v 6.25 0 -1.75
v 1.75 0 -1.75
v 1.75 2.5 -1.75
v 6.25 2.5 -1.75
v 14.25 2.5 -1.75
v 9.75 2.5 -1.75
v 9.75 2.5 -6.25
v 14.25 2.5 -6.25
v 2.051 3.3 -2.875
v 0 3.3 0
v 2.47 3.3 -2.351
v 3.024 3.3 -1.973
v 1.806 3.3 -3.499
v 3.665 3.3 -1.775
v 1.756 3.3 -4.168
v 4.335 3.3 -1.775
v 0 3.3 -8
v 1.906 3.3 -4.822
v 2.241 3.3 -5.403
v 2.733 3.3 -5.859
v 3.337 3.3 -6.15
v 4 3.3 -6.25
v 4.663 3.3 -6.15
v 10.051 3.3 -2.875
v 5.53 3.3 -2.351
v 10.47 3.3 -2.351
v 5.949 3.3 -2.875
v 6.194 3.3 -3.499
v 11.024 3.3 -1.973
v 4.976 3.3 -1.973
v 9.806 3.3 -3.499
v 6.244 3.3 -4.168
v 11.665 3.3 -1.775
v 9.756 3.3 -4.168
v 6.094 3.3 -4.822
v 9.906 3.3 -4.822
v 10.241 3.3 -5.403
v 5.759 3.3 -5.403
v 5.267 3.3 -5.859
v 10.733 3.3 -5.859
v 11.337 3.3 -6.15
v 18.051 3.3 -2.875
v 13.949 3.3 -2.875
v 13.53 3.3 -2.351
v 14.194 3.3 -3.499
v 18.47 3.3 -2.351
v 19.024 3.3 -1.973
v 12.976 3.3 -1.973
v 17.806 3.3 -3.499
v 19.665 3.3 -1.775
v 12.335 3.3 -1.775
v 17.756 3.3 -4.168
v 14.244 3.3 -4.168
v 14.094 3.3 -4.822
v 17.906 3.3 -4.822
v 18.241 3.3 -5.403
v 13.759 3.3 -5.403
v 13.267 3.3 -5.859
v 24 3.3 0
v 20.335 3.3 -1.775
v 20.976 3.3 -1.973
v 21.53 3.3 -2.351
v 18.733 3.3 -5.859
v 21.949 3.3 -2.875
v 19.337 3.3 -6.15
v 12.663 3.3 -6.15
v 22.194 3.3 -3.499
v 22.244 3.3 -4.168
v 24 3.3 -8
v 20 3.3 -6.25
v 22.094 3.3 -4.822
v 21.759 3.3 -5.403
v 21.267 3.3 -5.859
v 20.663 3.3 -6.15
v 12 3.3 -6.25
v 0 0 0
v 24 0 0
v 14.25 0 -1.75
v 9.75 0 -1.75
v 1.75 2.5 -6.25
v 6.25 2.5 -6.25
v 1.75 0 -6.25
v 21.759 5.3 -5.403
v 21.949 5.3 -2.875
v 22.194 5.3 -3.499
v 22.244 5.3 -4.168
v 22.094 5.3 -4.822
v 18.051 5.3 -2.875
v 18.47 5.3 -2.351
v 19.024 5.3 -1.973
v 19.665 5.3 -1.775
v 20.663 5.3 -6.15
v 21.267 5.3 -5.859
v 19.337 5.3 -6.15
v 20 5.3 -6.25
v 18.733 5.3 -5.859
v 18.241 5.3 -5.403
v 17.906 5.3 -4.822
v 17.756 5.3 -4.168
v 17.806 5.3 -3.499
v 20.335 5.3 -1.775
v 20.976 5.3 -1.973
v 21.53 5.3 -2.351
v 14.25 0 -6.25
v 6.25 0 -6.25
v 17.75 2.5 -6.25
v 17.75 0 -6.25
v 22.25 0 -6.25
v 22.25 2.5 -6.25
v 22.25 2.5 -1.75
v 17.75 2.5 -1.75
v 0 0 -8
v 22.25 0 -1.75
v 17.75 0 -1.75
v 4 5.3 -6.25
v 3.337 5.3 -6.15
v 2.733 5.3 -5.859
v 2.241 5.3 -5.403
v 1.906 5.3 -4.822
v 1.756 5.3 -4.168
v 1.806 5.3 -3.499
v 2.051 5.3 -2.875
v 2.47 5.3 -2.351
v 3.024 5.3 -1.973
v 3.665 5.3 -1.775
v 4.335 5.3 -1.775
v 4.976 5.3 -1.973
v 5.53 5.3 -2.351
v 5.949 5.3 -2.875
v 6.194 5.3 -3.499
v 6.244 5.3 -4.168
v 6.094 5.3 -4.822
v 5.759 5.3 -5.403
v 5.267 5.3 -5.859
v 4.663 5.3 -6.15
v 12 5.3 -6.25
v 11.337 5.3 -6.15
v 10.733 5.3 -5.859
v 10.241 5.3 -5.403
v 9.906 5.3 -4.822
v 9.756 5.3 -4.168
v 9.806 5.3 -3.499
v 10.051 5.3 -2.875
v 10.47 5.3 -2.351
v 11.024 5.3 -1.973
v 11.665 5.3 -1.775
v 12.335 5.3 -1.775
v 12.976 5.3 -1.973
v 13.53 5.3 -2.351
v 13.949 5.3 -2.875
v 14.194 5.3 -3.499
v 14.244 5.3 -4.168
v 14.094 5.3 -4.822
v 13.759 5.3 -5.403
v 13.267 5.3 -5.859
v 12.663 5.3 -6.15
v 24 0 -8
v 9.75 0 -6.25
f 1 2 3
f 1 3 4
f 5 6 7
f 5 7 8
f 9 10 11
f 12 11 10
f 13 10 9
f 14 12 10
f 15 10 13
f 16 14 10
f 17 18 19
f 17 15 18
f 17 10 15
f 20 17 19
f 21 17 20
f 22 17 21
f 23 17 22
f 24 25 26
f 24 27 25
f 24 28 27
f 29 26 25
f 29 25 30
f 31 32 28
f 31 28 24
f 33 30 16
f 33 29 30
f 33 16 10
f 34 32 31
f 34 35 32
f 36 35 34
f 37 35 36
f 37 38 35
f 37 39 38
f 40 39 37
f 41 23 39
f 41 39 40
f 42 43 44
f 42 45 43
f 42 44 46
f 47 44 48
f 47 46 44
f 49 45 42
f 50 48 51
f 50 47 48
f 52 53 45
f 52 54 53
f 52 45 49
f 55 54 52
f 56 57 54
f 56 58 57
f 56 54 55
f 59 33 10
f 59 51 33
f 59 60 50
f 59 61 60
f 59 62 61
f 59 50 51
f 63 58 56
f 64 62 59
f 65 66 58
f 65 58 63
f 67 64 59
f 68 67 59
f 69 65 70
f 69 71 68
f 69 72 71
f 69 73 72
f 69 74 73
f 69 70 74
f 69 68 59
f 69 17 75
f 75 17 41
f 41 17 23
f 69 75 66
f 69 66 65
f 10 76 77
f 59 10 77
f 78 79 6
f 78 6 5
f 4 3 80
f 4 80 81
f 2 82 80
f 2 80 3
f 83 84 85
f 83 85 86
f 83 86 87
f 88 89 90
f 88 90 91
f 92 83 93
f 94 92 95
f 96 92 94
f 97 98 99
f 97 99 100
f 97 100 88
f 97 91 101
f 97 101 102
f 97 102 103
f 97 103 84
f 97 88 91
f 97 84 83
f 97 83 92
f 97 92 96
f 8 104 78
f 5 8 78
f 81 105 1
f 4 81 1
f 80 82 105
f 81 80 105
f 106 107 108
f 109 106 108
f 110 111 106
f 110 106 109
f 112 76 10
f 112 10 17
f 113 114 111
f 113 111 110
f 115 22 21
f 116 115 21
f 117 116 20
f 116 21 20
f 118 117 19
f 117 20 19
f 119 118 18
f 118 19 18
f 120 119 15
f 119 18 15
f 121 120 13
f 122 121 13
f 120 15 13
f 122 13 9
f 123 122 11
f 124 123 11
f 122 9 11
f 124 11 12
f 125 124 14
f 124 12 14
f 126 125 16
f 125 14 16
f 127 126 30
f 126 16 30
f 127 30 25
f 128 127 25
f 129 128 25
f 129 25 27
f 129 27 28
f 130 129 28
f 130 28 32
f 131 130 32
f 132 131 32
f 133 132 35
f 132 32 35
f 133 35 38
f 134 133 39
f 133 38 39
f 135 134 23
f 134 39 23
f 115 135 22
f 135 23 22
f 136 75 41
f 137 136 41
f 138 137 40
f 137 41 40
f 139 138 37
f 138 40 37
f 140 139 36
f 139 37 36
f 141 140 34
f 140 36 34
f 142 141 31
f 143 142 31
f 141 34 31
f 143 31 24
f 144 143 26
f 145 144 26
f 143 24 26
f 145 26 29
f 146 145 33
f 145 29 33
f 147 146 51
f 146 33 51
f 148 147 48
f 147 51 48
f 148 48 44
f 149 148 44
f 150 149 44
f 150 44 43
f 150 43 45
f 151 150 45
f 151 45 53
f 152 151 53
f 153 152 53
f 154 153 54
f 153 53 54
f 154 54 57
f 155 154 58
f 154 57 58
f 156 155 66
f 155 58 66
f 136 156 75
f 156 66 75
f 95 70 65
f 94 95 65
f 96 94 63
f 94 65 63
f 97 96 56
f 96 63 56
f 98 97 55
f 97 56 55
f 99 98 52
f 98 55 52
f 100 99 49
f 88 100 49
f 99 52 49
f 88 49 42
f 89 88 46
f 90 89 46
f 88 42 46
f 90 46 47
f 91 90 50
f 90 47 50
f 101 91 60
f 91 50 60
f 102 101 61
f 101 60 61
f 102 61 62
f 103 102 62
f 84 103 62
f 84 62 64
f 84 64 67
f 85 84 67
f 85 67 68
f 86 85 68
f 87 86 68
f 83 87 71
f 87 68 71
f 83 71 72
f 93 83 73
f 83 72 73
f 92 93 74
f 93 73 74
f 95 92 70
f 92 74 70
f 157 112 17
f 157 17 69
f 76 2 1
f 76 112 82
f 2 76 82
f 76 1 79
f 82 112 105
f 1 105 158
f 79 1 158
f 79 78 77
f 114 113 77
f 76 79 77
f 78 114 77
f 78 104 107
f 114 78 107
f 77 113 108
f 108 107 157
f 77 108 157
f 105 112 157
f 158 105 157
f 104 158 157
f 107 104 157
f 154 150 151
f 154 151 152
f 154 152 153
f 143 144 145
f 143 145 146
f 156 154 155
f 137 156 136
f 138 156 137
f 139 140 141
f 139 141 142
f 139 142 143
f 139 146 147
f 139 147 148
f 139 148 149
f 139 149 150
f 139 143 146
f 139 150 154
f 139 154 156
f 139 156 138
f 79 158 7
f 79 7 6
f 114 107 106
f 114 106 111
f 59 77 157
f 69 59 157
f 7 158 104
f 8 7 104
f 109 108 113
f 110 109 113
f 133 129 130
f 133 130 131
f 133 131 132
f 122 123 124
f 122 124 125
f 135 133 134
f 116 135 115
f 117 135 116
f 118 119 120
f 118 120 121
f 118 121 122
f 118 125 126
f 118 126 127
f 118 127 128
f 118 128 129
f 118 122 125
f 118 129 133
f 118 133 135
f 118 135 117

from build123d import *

# Parameters (mm, degrees)
SKETCH1_W       = 24
SKETCH1_H       = 8
EXTRUDE1_DEPTH  = 3.3
SKETCH2_R       = 2.25
EXTRUDE2_DEPTH  = 2
SKETCH3_W       = 4.5
SKETCH3_H       = 4.5
EXTRUDE3_DEPTH  = 2.5
LPATTERN1_COUNT = 4
LPATTERN1_PITCH = 8
LPATTERN2_COUNT = 4
LPATTERN2_PITCH = 8


with BuildPart() as part:
    # Sketch1 → Extrude1 (new body)
    with BuildSketch(Plane(origin=(0, 0, 0), x_dir=(1, 0, 0), z_dir=(0, 1, 0))):
        with Locations((12, 4)):
            Rectangle(SKETCH1_W, SKETCH1_H)
    extrude(amount=EXTRUDE1_DEPTH)

    # Sketch2 → Extrude2 (add)
    with BuildSketch(Plane(origin=(0, 3.3, 0), x_dir=(1, 0, 0), z_dir=(0, 1, 0))):
        with Locations(Location((4, 4, 0), (0, 0, 90))):
            Circle(SKETCH2_R)
    extrude2 = extrude(amount=EXTRUDE2_DEPTH)

    # Sketch3 → Extrude3 (cut)
    with BuildSketch(Plane.XZ):
        with Locations((20, -4)):
            Rectangle(SKETCH3_W, SKETCH3_H)
    extrude3 = extrude(amount=-EXTRUDE3_DEPTH, mode=Mode.SUBTRACT)

    # LPattern1: Extrude2 ×4, 1 skipped
    with Locations(*[(i * LPATTERN1_PITCH, 0, 0) for i in range(1, LPATTERN1_COUNT) if i not in (3,)]):
        add(extrude2)

    # LPattern2: Extrude3 ×4
    with Locations(*[(-i * LPATTERN2_PITCH, 0, 0) for i in range(1, LPATTERN2_COUNT)]):
        add(extrude3, mode=Mode.SUBTRACT)


solid = part.part
